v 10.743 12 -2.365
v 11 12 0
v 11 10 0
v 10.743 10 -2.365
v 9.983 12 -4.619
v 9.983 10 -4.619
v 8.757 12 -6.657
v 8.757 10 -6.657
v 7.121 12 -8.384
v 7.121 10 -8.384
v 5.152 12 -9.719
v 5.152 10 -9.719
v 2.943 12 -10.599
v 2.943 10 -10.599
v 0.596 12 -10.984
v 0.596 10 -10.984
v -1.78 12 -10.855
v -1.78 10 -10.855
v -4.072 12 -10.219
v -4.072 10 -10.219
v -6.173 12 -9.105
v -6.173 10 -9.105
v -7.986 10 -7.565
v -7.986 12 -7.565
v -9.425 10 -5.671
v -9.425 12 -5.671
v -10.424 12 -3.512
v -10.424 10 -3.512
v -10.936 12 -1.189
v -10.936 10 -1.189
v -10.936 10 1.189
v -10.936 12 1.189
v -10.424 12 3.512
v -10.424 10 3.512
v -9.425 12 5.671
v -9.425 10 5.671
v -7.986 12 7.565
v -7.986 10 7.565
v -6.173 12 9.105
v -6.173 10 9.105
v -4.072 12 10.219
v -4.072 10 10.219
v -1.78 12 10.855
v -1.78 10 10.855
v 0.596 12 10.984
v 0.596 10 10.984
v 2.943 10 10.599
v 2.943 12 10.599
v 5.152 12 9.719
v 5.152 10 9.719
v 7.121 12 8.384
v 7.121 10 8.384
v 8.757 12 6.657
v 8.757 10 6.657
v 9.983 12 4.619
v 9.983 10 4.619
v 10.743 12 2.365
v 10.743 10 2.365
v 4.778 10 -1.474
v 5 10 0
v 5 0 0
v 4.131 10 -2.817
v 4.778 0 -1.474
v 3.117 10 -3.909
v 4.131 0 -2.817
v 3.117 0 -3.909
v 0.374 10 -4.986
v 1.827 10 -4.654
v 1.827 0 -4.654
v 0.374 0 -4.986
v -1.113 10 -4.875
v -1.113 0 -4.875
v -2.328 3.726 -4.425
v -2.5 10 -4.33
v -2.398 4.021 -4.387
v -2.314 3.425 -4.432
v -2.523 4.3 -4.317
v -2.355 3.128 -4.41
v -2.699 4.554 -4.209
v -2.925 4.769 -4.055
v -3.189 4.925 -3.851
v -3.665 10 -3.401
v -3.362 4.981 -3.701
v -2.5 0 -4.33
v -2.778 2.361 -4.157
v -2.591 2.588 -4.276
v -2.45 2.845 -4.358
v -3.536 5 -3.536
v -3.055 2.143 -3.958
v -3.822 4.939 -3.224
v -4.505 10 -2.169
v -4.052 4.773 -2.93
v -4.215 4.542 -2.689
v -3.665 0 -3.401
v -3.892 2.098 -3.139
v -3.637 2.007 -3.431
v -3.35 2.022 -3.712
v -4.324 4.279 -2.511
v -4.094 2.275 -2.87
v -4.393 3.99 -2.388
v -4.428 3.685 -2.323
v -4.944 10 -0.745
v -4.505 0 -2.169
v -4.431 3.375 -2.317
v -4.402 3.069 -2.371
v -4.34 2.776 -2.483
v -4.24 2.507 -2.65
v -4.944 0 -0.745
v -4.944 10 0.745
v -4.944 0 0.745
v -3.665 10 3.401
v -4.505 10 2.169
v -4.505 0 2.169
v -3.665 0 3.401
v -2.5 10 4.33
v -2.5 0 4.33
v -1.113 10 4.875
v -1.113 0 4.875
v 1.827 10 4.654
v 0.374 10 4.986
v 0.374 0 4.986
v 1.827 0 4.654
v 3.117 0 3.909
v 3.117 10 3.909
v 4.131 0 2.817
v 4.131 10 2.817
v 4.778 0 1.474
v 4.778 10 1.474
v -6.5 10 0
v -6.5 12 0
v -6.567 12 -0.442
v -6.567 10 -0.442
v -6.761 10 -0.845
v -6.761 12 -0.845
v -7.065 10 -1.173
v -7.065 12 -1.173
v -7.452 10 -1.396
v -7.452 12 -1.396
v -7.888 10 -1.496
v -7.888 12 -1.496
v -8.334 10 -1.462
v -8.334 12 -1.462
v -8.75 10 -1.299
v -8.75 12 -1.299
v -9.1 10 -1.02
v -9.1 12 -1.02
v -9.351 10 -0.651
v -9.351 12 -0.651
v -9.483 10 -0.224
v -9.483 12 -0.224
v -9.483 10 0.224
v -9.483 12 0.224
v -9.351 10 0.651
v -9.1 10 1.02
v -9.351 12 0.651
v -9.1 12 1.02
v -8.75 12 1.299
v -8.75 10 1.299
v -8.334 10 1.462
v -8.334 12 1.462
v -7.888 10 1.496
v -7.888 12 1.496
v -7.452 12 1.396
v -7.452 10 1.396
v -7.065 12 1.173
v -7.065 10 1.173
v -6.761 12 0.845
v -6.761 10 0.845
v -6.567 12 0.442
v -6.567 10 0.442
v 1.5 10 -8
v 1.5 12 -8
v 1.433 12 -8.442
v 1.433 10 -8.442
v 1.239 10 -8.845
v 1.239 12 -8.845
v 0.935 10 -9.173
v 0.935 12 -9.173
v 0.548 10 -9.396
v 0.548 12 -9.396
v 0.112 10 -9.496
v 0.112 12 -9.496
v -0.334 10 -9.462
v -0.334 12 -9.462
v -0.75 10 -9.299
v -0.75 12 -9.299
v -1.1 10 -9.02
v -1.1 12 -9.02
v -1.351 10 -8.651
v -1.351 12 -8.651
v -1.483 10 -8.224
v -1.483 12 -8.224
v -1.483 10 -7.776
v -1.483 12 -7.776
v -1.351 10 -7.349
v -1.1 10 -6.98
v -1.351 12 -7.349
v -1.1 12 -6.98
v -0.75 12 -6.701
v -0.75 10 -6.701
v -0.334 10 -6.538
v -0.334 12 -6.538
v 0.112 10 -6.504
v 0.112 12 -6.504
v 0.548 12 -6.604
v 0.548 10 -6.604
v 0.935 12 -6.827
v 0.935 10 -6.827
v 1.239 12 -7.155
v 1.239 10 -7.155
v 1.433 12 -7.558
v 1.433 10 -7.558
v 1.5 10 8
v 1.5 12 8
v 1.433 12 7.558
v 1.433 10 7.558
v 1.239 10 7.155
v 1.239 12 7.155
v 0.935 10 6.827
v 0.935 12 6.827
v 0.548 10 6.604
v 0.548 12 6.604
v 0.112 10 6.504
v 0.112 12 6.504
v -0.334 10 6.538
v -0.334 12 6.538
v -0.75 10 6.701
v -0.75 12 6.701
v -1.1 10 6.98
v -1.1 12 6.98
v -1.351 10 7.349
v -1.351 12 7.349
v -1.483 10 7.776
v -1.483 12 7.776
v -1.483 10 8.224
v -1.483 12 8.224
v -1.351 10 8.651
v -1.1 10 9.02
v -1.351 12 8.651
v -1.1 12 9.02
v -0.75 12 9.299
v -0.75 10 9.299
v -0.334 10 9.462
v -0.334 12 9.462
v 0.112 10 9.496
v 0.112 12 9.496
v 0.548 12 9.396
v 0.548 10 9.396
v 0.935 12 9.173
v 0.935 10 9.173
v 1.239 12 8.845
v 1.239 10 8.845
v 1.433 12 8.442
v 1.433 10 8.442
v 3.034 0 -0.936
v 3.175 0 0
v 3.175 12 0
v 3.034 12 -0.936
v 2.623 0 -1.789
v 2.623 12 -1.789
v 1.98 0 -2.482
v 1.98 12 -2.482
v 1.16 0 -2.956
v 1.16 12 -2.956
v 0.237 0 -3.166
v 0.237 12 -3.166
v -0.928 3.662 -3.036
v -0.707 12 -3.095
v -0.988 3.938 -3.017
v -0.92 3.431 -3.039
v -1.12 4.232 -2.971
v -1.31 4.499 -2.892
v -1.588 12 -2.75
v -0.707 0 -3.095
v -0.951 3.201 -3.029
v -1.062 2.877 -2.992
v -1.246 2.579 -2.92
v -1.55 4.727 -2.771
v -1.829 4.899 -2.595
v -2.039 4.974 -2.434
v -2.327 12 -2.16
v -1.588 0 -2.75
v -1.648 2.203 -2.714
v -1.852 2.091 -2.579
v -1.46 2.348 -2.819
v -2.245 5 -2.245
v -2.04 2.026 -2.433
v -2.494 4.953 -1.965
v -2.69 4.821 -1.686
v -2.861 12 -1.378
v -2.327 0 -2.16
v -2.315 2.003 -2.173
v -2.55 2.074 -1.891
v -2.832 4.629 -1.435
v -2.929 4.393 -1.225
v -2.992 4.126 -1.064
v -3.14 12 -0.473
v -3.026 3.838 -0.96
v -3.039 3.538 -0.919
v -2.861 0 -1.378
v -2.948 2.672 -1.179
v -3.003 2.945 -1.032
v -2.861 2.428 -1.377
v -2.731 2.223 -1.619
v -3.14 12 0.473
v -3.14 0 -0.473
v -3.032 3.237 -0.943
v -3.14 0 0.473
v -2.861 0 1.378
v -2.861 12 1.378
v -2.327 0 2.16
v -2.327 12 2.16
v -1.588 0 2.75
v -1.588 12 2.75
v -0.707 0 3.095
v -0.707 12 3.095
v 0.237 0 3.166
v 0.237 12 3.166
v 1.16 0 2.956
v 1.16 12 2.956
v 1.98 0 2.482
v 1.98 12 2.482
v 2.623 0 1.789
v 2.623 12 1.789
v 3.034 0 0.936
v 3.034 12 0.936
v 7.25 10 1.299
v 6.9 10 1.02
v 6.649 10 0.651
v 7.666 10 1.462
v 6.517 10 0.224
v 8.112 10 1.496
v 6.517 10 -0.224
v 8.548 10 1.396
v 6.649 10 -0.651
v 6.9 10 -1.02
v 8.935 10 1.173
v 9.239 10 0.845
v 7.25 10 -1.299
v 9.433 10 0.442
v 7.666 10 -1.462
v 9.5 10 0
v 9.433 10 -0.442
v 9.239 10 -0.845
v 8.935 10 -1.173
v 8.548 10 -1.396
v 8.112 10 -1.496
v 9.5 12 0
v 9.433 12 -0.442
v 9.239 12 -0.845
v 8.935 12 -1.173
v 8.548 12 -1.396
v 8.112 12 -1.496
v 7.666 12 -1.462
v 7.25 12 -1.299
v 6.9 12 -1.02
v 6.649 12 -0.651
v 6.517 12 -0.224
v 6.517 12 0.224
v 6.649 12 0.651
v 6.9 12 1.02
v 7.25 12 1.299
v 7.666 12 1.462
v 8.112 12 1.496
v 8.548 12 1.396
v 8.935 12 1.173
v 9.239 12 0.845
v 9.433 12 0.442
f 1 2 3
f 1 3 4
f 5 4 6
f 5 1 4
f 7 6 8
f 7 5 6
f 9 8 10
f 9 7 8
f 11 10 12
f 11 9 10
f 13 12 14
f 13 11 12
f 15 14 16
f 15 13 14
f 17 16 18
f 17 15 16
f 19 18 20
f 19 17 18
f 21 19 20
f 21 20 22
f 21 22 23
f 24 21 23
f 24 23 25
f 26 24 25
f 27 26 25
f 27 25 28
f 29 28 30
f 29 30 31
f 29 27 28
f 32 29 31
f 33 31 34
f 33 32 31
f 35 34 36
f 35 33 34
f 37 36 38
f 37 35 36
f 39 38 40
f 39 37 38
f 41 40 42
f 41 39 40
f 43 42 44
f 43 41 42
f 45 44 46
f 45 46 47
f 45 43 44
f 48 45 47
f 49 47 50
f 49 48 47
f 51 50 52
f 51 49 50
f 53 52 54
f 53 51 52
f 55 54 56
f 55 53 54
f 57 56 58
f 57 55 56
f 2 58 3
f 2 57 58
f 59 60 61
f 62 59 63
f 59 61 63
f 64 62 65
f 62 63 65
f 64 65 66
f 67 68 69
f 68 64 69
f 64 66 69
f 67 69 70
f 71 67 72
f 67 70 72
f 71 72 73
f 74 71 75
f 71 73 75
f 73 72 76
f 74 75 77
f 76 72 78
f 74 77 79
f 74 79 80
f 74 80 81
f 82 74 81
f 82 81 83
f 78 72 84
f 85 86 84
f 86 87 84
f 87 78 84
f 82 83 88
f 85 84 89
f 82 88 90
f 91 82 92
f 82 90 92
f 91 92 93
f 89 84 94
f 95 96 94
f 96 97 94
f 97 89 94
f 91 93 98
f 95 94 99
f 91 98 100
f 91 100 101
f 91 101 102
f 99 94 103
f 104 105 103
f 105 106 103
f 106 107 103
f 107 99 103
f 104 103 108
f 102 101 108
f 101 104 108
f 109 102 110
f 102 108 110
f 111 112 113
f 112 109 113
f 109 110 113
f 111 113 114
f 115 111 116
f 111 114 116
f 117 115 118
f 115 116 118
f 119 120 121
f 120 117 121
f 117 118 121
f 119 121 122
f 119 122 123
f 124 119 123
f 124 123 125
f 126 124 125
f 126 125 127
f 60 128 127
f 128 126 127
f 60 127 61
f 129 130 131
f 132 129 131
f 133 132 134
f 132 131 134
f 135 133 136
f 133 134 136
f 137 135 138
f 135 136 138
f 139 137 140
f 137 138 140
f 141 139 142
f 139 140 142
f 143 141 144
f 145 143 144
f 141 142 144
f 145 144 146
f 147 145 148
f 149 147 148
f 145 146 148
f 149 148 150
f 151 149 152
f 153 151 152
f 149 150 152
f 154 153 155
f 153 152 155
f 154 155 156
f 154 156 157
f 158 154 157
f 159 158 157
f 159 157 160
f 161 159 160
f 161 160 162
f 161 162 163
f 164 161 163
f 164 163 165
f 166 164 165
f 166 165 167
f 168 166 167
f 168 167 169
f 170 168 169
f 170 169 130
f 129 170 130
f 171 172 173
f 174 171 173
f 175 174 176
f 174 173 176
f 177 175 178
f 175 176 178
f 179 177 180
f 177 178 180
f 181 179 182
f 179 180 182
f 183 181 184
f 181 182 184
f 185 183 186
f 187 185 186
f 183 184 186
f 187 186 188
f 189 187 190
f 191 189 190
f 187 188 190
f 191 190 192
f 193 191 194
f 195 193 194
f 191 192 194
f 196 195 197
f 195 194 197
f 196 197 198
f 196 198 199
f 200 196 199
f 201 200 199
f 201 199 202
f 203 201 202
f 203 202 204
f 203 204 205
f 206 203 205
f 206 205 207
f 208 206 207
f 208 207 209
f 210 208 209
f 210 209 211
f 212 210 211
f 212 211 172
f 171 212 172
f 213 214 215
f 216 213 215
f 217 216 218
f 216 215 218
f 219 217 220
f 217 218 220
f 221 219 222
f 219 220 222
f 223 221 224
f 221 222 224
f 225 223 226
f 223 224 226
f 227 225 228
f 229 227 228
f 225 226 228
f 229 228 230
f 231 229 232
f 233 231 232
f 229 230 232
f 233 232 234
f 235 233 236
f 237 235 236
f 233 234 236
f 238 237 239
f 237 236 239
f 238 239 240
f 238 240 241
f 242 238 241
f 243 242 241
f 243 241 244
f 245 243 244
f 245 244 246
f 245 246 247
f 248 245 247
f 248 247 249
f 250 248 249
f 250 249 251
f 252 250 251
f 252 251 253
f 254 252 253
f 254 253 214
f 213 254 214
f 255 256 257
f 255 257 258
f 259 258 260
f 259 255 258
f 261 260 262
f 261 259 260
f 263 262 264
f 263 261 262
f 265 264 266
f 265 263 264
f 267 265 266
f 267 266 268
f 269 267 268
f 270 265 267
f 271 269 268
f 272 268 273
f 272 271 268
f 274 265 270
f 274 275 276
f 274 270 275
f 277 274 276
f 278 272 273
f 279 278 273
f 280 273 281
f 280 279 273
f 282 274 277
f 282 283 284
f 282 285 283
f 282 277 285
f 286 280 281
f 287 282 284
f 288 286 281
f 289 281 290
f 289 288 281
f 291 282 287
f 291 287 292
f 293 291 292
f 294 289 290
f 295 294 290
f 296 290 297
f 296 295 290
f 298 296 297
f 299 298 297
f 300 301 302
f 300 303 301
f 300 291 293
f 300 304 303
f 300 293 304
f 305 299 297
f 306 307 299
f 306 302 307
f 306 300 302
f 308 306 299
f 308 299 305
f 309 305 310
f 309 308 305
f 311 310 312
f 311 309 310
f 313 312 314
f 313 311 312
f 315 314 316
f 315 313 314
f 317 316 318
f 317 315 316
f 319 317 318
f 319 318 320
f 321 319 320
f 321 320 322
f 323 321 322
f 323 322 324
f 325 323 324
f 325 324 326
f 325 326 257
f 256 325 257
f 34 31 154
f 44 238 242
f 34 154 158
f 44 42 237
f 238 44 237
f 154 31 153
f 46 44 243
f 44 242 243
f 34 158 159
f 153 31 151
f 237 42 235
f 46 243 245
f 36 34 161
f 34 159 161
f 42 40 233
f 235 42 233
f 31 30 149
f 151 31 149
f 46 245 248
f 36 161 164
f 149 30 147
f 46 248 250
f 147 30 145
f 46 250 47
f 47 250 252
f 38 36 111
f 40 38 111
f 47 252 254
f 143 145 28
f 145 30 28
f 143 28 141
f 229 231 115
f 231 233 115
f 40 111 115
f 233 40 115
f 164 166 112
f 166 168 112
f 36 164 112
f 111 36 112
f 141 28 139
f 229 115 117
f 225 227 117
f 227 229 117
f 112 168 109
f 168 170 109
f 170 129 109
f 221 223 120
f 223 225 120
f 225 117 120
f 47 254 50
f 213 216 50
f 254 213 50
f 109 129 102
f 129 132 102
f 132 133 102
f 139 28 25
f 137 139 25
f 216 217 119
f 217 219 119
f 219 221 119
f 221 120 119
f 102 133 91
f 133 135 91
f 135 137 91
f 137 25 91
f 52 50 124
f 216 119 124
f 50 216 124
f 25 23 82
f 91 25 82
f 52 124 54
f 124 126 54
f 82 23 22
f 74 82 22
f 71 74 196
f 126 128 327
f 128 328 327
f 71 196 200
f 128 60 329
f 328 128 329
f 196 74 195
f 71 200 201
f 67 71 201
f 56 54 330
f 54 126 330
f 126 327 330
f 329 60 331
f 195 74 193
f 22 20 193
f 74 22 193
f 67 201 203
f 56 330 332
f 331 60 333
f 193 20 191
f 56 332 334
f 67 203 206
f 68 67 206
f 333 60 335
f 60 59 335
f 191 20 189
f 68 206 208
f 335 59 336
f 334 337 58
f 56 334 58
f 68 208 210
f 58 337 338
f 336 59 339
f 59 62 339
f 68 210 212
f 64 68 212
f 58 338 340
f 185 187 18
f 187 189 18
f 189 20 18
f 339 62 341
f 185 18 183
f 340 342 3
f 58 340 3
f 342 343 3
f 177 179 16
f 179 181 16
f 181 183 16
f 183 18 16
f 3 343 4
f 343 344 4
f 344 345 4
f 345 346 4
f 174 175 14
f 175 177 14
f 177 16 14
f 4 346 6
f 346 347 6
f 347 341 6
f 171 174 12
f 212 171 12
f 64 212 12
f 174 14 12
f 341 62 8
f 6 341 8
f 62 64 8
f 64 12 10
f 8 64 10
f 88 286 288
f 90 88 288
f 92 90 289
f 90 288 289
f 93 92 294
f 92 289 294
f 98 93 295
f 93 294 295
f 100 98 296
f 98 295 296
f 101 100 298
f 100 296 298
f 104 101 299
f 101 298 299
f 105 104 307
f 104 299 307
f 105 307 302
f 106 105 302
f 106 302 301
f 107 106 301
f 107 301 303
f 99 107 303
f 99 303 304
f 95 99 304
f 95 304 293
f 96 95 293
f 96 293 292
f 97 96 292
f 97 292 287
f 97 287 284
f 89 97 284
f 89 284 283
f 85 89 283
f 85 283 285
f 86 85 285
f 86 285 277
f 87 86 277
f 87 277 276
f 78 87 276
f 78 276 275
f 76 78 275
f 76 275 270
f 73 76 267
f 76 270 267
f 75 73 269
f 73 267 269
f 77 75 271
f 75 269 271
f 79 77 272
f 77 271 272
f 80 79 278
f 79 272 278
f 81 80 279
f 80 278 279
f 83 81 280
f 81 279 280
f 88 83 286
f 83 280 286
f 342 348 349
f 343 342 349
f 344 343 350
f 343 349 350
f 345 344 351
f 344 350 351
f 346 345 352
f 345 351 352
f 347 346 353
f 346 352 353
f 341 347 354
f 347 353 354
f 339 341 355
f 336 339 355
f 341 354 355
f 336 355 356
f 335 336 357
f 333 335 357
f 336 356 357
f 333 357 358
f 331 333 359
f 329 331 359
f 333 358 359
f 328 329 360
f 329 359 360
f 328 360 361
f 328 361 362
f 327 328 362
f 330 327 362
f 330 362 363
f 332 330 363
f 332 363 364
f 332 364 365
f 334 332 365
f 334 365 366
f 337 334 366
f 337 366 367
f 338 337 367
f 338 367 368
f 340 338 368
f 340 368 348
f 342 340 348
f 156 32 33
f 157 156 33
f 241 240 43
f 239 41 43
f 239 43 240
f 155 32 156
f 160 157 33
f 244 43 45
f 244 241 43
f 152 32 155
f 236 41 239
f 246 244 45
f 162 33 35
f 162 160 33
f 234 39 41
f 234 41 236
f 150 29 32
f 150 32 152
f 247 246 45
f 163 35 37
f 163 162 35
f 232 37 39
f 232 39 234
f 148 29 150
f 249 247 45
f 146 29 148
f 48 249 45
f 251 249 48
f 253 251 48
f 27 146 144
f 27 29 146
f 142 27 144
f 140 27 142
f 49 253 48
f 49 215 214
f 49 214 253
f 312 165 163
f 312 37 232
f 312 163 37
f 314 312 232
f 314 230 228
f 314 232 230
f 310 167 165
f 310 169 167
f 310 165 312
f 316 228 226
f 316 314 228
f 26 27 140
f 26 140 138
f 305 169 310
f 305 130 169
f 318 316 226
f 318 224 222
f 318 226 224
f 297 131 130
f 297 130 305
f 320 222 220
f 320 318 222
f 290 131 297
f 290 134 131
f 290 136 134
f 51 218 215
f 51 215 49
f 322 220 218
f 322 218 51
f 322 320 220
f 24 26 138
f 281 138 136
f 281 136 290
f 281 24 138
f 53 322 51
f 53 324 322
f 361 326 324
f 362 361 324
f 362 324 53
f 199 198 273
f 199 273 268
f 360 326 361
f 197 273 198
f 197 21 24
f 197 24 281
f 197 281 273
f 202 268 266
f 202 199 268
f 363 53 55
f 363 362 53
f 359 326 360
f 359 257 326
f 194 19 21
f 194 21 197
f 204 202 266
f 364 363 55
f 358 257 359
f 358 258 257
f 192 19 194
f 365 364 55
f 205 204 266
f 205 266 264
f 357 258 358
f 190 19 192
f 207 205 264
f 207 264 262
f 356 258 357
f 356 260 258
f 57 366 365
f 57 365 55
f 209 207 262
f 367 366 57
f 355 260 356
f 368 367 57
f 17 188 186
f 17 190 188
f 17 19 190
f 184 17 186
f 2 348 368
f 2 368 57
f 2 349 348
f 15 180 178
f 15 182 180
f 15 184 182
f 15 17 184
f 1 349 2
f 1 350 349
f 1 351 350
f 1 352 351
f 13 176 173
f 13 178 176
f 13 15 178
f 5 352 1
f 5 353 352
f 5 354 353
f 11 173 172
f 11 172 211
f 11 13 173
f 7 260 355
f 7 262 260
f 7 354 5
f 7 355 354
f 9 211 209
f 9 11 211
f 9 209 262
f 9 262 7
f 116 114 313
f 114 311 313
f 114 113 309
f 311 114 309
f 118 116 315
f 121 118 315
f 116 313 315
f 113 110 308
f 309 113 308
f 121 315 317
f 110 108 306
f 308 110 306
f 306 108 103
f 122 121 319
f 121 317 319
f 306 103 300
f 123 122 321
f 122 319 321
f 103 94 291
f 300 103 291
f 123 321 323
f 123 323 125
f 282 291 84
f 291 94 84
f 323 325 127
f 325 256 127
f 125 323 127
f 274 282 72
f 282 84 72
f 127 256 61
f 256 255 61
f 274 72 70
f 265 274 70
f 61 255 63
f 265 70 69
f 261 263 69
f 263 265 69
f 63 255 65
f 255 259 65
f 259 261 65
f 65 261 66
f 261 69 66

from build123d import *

# Parameters (mm, degrees)
SKETCH1_R           = 5
SKETCH1_R_2         = 3.175
BOSS_EXTRUDE1_DEPTH = 12
BOSS_EXTRUDE2_START = -2.000000064
SKETCH2_R           = 11
SKETCH2_R_2         = 3.175
BOSS_EXTRUDE2_DEPTH = 2.000000064
SKETCH3_R           = 1.5
CUT_EXTRUDE1_DEPTH  = 20.646882704
CUT_EXTRUDE2_DEPTH  = 20.646882704


with BuildPart() as part:
    # Sketch1 → Boss-Extrude1 (new body)
    with BuildSketch(Plane(origin=(0, 0, 0), x_dir=(1, 0, 0), z_dir=(0, 1, 0))):
        Circle(SKETCH1_R)
        Circle(SKETCH1_R_2, mode=Mode.SUBTRACT)
    extrude(amount=BOSS_EXTRUDE1_DEPTH)

    # Sketch2 → Boss-Extrude2 (add)
    with BuildSketch(Plane(origin=(0, 12, 0), x_dir=(1, 0, 0), z_dir=(0, 1, 0)).offset(BOSS_EXTRUDE2_START)):
        Circle(SKETCH2_R)
        Circle(SKETCH2_R_2, mode=Mode.SUBTRACT)
    extrude(amount=BOSS_EXTRUDE2_DEPTH)

    # Sketch3 → Cut-Extrude1 (cut, through all)
    with BuildSketch(Plane(origin=(0, 12, 0), x_dir=(1, 0, 0), z_dir=(0, 1, 0))):
        with Locations((0, 8)):
            Circle(SKETCH3_R)
        with Locations((8, 0)):
            Circle(SKETCH3_R)
        with Locations((0, -8)):
            Circle(SKETCH3_R)
        with Locations((-8, 0)):
            Circle(SKETCH3_R)
    extrude(amount=-CUT_EXTRUDE1_DEPTH, mode=Mode.SUBTRACT)

    # Sketch4 → Cut-Extrude2 (cut, through all)
    with BuildSketch(Plane(origin=(0, 0, 0), x_dir=(0, 1, 0), z_dir=(0.7071067811865464, 0, 0.7071067811865488))):
        with BuildLine():
            ThreePointArc((2.000000064, 0), (3.500000112, -1.500000048), (5.00000016, 0))
            ThreePointArc((5.00000016, 0), (3.500000112, 1.500000048), (2.000000064, 0))
        make_face()
    extrude(amount=-CUT_EXTRUDE2_DEPTH, mode=Mode.SUBTRACT)


solid = part.part
